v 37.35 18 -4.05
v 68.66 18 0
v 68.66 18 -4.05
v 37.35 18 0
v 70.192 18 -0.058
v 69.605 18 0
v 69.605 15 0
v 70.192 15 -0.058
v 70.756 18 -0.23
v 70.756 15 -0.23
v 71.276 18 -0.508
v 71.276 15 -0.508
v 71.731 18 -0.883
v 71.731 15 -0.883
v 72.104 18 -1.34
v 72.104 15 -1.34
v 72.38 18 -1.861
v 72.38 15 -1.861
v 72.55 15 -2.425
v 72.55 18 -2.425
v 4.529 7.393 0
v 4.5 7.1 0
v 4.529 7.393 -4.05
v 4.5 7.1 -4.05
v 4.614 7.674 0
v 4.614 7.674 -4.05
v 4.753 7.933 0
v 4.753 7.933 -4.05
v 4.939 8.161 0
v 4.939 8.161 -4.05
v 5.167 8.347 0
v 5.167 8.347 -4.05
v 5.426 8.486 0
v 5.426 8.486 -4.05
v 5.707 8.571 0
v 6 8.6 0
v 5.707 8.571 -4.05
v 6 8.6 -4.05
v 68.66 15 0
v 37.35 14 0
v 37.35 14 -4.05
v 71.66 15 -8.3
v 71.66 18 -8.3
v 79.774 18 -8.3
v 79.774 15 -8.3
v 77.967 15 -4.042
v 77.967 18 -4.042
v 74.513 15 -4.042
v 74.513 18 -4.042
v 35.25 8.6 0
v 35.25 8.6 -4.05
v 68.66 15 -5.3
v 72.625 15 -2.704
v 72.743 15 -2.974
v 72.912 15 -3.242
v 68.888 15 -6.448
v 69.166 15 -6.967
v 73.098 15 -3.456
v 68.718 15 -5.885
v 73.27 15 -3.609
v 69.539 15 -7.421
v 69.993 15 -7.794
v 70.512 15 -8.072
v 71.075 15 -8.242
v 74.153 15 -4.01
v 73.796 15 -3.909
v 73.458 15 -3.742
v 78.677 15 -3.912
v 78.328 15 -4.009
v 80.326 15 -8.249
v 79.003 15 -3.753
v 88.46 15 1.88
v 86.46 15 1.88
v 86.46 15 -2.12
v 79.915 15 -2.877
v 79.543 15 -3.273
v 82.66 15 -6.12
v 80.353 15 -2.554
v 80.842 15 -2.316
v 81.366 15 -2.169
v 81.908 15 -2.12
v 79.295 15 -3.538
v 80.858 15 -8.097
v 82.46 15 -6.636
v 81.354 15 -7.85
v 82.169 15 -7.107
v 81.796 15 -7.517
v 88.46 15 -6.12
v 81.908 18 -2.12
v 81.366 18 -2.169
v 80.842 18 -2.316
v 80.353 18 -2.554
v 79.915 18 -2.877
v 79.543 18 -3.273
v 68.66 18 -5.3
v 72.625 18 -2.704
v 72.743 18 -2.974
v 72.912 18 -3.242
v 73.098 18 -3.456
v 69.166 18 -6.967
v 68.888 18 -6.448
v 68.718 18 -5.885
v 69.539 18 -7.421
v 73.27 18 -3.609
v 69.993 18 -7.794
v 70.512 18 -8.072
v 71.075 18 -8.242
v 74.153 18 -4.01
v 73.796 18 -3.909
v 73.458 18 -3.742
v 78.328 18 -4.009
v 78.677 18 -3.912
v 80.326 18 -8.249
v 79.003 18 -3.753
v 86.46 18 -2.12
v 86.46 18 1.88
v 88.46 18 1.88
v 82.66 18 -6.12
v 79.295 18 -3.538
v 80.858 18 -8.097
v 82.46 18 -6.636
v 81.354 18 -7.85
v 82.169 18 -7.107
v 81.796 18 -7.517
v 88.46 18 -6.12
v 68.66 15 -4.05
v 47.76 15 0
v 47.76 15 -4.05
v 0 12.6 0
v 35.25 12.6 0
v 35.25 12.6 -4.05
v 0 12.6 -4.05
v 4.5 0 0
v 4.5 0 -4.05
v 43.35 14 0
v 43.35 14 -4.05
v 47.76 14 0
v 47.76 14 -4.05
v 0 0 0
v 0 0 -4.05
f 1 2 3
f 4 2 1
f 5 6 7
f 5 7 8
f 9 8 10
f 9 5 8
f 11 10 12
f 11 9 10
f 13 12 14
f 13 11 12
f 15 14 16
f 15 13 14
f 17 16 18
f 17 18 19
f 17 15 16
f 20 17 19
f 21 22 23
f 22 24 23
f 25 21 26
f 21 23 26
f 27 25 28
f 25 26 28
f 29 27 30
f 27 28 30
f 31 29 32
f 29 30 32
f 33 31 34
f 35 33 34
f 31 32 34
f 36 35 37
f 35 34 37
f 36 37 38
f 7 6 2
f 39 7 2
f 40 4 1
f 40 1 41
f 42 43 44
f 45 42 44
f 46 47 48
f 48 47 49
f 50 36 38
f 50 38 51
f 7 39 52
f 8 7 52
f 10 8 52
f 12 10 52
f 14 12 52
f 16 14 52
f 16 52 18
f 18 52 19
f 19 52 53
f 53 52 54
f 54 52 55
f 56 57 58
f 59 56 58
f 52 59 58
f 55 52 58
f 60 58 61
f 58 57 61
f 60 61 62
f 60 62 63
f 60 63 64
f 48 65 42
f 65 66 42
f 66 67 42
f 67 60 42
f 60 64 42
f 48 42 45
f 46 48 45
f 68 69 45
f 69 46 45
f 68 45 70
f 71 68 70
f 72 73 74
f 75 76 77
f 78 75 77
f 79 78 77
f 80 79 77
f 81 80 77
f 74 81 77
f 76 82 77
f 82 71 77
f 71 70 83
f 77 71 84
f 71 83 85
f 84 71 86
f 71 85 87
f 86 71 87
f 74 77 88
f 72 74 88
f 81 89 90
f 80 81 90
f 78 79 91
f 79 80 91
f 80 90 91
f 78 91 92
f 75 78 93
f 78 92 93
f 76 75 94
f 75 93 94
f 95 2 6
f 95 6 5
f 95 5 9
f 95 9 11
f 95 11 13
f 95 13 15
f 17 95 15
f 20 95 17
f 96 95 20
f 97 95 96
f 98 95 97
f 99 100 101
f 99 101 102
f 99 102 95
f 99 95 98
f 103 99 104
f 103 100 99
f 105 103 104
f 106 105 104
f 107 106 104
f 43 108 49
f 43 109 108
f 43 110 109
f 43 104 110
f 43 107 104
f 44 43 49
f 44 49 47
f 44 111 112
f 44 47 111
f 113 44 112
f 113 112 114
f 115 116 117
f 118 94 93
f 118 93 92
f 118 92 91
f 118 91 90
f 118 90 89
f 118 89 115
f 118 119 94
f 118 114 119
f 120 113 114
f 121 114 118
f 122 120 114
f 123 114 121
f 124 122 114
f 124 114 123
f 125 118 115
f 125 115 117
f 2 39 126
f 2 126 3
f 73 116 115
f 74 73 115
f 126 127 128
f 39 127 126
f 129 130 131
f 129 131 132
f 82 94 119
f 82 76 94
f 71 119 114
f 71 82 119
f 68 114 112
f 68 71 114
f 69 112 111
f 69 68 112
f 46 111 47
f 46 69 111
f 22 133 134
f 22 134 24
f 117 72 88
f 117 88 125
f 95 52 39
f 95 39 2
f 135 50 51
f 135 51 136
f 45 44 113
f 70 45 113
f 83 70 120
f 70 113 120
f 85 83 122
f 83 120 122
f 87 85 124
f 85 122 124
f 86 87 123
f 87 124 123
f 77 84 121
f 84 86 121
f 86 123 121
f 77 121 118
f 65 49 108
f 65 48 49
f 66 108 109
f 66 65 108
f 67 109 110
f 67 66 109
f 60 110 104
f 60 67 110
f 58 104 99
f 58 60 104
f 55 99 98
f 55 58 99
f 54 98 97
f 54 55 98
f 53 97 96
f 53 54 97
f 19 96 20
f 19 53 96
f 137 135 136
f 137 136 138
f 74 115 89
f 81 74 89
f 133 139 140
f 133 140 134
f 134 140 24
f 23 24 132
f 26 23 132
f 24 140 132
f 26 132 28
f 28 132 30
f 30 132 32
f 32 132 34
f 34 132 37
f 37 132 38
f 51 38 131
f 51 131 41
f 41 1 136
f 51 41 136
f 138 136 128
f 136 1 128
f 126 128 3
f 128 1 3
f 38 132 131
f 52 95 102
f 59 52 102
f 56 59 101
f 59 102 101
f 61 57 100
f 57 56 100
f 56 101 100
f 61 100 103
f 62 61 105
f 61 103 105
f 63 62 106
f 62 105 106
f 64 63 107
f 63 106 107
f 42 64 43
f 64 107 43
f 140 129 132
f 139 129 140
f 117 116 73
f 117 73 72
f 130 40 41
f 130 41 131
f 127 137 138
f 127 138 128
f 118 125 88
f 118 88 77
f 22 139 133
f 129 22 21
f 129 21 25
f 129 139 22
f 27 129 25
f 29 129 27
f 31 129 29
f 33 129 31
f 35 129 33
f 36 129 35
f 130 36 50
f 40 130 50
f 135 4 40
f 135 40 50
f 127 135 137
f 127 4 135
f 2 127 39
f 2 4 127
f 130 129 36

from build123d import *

# Parameters (mm, degrees)
F0_W        = 4.5
F0_H        = 8.6
F0_W_2      = 20.9
F0_H_2      = 3
F1_DEPTH    = 4.05
F0_W_3      = 19.8
F2_DEPTH    = 8.3
F3_DEPTH    = 1.88
F4_W        = 5.8
F4_H        = 2.18
F5_DEPTH    = 25
F6_T1_DEPTH = 18
F6_T3_DEPTH = 17.4287906631
F6_T5_DEPTH = 16.9987425023
F7_R        = 2
F8_R        = 1.5


# Not quite as in the source:
# - a fillet or chamfer that OpenCascade refuses, or shapes differently, is made with other operations: its cross-section is extruded or revolved along the edge and cut away or added
# - a feature names something its author has since deleted; it is built from what else it names


with BuildPart() as f1:
    # F0 (on Top) → F1 (new body)
    with BuildSketch(Plane.XY):
        with Locations((2.25, 4.3)):
            Rectangle(F0_W, F0_H)
        Polygon((0, 12.6), (0, 8.6), (4.5, 8.6), (35.25, 8.6), (35.25, 12.6), align=None)
        Polygon((35.25, 12.6), (35.25, 8.6), (43.35, 14), (37.35, 14), align=None)
        Polygon((37.35, 14), (43.35, 14), (47.76, 14), (47.76, 15), (47.76, 18), (37.35, 18), align=None)
        with Locations((58.21, 16.5)):
            Rectangle(F0_W_2, F0_H_2)
    extrude(amount=-F1_DEPTH)

    # F8
    f8_edges = [f1.edges().sort_by_distance(p)[0] for p in [
        (4.5, 8.6, -2.025),
    ]]
    fillet(f8_edges, radius=F8_R)


with BuildPart() as f2:
    # F0 (on Top) → F2 (new body)
    with BuildSketch(Plane.XY):
        with Locations((78.56, 16.5)):
            Rectangle(F0_W_3, F0_H_2)
    extrude(amount=-F2_DEPTH)

    # F0 (on Top) → F3 (join)
    with BuildSketch(Plane.XY):
        with Locations((78.56, 16.5)):
            Rectangle(F0_W_3, F0_H_2)
    extrude(amount=F3_DEPTH)

    # F4 (on face) → F5 (cut)
    with BuildSketch(Plane(origin=(0, 18, 0), x_dir=(-1, 0, 0), z_dir=(0, 1, 0))):
        with Locations((-85.56, -7.21)):
            Rectangle(F4_W, F4_H)
        Polygon((-68.66, 1.88), (-86.46, 1.88), (-86.46, -2.12), (-82.66, -2.12), (-79.1077613831, -2.12), (-79.1077613831, -4.0423134342), (-72.6052895188, -4.0423134342), (-72.6052895188, 0), (-68.66, 0), align=None)
    extrude(amount=-F5_DEPTH, mode=Mode.SUBTRACT)

    # F6: fillet of radius 3 on 4 edges, made by hand

    # F6_s2 → F6_t1 (cut)
    with BuildSketch(Plane.XZ.offset(-25.5)):
        with BuildLine():
            ThreePointArc((68.66, -5.3), (69.5386796564, -7.4213203436), (71.66, -8.3))
            Line((71.66, -8.3), (68.66, -8.3))
            Line((68.66, -8.3), (68.66, -5.3))
        make_face()
        with BuildLine():
            ThreePointArc((69.6052895188, 0), (71.7266098624, -0.8786796564), (72.6052895188, -3))
            Line((72.6052895188, -3), (72.6052895188, 0))
            Line((72.6052895188, 0), (69.6052895188, 0))
        make_face()
    extrude(amount=F6_T1_DEPTH, mode=Mode.SUBTRACT)

    # F6_s4 → F6_t3 (cut)
    with BuildSketch(Plane.XZ.offset(-25.2143953316)):
        with BuildLine():
            ThreePointArc((79.7742418674, -8.3), (81.5825559994, -7.6937418407), (82.66, -6.12))
            Line((82.66, -6.12), (82.66, -8.3))
            Line((82.66, -8.3), (79.7742418674, -8.3))
        make_face()
    extrude(amount=F6_T3_DEPTH, mode=Mode.SUBTRACT)

    # F6_s6 → F6_t5 (cut)
    with BuildSketch(Plane.XZ.offset(-24.9993712512)):
        with BuildLine():
            ThreePointArc((81.9075098835, -2.12), (80.2094315133, -2.6468380868), (79.1077613831, -4.0423134342))
            Line((79.1077613831, -4.0423134342), (79.1077613831, -2.12))
            Line((79.1077613831, -2.12), (81.9075098835, -2.12))
        make_face()
    extrude(amount=F6_T5_DEPTH, mode=Mode.SUBTRACT)

    # F7
    f7_edges = [f2.edges().sort_by_distance(p)[0] for p in [
        (72.60529, 16.5, -4.042313),
        (79.107761, 16.5, -4.042313),
    ]]
    fillet(f7_edges, radius=F7_R)


solid = Compound([f1.part, f2.part])
